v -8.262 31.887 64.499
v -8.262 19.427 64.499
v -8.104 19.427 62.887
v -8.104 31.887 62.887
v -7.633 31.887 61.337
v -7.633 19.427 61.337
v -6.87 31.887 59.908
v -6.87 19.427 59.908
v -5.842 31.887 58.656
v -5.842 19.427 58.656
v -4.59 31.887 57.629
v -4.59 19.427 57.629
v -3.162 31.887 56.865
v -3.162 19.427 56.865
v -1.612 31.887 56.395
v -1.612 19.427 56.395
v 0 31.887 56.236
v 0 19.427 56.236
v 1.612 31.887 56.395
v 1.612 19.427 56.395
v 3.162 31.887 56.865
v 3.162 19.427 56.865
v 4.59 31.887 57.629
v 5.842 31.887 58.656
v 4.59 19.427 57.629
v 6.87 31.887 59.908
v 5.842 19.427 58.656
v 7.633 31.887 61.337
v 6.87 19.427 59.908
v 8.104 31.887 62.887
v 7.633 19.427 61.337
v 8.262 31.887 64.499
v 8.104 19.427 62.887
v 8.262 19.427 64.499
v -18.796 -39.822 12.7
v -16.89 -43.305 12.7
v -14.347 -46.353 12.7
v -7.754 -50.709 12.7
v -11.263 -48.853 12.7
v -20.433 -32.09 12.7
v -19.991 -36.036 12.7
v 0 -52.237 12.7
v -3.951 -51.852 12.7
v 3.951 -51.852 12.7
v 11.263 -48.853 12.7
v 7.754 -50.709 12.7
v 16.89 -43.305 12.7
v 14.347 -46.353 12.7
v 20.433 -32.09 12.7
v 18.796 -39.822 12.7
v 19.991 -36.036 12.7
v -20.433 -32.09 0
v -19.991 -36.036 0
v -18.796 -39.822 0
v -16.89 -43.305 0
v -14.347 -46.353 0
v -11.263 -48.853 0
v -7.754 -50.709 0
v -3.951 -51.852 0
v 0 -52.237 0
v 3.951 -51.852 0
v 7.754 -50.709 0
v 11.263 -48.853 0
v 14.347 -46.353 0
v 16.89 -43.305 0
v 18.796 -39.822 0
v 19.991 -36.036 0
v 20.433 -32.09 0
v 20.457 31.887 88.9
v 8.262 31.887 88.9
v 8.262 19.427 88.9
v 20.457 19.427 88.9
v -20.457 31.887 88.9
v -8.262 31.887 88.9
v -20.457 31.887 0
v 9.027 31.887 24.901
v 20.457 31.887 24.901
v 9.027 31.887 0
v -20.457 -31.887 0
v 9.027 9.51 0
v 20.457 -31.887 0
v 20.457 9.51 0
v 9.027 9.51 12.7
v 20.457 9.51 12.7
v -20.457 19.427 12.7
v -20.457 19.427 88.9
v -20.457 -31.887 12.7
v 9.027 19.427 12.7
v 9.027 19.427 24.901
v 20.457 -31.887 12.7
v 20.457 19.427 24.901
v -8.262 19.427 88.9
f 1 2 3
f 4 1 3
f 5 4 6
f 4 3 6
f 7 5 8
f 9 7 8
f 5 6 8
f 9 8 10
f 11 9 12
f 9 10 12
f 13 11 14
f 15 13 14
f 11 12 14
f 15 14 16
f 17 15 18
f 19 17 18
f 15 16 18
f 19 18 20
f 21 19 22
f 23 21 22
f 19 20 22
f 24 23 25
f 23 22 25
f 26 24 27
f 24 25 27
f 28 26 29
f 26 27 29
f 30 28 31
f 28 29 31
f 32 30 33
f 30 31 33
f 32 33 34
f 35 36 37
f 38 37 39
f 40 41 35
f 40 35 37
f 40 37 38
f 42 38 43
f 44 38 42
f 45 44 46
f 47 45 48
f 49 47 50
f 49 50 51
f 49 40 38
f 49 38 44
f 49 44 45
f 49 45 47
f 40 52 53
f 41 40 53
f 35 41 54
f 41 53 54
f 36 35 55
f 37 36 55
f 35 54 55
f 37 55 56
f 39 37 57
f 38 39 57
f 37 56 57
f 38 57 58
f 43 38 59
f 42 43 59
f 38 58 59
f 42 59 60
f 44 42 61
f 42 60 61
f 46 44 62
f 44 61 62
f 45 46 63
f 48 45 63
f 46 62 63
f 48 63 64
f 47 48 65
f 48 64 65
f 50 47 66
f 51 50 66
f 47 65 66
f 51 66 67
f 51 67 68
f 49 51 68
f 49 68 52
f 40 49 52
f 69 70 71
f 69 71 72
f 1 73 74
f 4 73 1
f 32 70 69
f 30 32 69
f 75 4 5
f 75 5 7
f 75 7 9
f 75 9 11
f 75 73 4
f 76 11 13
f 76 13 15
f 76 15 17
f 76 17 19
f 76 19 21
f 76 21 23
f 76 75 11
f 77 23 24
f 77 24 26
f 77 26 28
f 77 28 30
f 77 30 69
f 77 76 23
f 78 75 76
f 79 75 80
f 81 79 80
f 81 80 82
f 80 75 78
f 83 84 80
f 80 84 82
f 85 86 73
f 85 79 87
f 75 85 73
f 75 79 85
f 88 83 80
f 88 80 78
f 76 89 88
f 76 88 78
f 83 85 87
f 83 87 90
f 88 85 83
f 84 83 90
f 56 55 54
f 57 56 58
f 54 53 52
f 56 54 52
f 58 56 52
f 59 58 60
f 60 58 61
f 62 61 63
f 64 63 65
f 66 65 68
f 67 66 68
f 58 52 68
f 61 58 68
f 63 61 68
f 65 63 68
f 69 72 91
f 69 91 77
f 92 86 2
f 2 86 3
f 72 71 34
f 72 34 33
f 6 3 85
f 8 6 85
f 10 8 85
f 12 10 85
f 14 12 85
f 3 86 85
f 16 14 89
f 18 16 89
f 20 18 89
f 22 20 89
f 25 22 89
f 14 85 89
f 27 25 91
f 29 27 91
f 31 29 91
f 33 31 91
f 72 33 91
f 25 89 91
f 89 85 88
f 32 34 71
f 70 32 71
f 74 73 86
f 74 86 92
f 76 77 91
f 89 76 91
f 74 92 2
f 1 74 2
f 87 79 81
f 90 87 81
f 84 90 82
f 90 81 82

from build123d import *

# Parameters (mm, degrees)
F0_W     = 40.913024
F0_H     = 63.774832
F2_DEPTH = 12.7
F3_W     = 40.913024
F3_H     = 12.460528
F4_DEPTH = 76.2
F6_DEPTH = 25.4
F7_W     = 8.801125
F7_H     = 17.41853
F8_DEPTH = 11.43


with BuildPart() as f2:
    # F0 (on Top) + F1 (on face) → F2 (new body)
    with BuildSketch(Plane.XY):
        Rectangle(F0_W, F0_H)
    with BuildSketch(Plane.XY):
        with BuildLine():
            Line((20.432689, -32.090344), (-20.432689, -32.090344))
            ThreePointArc((-20.432689, -32.090344), (0, -52.237251), (20.432689, -32.090344))
        make_face()
    extrude(amount=F2_DEPTH)

    # F3 (on face) → F4 (join)
    with BuildSketch(Plane.XY.offset(12.7)):
        with Locations((0, 25.657152)):
            Rectangle(F3_W, F3_H)
    extrude(amount=F4_DEPTH)

    # F5 (on face) → F6 (cut)
    with BuildSketch(Plane.XZ.offset(-19.426888)):
        with BuildLine():
            Line((8.262424, 88.9), (-8.262424, 88.9))
            Line((-8.262424, 88.9), (-8.262424, 64.498752))
            ThreePointArc((-8.262424, 64.498752), (0, 56.236329), (8.262424, 64.498752))
            Line((8.262424, 64.498752), (8.262424, 88.9))
        make_face()
    extrude(amount=-F6_DEPTH, mode=Mode.SUBTRACT)

    # F7 (on face) → F8 (cut)
    with BuildSketch(Plane.YZ.offset(20.456512)):
        Polygon((19.426888, 24.901479), (19.426888, 17.41853), (19.426888, 12.7), (9.509583, 12.7), (9.509583, 0), (31.887416, 0), (31.887416, 17.41853), (31.887416, 24.901479), align=None)
        with Locations((36.287979, 8.709265)):
            Rectangle(F7_W, F7_H)
    extrude(amount=-F8_DEPTH, mode=Mode.SUBTRACT)


solid = f2.part
